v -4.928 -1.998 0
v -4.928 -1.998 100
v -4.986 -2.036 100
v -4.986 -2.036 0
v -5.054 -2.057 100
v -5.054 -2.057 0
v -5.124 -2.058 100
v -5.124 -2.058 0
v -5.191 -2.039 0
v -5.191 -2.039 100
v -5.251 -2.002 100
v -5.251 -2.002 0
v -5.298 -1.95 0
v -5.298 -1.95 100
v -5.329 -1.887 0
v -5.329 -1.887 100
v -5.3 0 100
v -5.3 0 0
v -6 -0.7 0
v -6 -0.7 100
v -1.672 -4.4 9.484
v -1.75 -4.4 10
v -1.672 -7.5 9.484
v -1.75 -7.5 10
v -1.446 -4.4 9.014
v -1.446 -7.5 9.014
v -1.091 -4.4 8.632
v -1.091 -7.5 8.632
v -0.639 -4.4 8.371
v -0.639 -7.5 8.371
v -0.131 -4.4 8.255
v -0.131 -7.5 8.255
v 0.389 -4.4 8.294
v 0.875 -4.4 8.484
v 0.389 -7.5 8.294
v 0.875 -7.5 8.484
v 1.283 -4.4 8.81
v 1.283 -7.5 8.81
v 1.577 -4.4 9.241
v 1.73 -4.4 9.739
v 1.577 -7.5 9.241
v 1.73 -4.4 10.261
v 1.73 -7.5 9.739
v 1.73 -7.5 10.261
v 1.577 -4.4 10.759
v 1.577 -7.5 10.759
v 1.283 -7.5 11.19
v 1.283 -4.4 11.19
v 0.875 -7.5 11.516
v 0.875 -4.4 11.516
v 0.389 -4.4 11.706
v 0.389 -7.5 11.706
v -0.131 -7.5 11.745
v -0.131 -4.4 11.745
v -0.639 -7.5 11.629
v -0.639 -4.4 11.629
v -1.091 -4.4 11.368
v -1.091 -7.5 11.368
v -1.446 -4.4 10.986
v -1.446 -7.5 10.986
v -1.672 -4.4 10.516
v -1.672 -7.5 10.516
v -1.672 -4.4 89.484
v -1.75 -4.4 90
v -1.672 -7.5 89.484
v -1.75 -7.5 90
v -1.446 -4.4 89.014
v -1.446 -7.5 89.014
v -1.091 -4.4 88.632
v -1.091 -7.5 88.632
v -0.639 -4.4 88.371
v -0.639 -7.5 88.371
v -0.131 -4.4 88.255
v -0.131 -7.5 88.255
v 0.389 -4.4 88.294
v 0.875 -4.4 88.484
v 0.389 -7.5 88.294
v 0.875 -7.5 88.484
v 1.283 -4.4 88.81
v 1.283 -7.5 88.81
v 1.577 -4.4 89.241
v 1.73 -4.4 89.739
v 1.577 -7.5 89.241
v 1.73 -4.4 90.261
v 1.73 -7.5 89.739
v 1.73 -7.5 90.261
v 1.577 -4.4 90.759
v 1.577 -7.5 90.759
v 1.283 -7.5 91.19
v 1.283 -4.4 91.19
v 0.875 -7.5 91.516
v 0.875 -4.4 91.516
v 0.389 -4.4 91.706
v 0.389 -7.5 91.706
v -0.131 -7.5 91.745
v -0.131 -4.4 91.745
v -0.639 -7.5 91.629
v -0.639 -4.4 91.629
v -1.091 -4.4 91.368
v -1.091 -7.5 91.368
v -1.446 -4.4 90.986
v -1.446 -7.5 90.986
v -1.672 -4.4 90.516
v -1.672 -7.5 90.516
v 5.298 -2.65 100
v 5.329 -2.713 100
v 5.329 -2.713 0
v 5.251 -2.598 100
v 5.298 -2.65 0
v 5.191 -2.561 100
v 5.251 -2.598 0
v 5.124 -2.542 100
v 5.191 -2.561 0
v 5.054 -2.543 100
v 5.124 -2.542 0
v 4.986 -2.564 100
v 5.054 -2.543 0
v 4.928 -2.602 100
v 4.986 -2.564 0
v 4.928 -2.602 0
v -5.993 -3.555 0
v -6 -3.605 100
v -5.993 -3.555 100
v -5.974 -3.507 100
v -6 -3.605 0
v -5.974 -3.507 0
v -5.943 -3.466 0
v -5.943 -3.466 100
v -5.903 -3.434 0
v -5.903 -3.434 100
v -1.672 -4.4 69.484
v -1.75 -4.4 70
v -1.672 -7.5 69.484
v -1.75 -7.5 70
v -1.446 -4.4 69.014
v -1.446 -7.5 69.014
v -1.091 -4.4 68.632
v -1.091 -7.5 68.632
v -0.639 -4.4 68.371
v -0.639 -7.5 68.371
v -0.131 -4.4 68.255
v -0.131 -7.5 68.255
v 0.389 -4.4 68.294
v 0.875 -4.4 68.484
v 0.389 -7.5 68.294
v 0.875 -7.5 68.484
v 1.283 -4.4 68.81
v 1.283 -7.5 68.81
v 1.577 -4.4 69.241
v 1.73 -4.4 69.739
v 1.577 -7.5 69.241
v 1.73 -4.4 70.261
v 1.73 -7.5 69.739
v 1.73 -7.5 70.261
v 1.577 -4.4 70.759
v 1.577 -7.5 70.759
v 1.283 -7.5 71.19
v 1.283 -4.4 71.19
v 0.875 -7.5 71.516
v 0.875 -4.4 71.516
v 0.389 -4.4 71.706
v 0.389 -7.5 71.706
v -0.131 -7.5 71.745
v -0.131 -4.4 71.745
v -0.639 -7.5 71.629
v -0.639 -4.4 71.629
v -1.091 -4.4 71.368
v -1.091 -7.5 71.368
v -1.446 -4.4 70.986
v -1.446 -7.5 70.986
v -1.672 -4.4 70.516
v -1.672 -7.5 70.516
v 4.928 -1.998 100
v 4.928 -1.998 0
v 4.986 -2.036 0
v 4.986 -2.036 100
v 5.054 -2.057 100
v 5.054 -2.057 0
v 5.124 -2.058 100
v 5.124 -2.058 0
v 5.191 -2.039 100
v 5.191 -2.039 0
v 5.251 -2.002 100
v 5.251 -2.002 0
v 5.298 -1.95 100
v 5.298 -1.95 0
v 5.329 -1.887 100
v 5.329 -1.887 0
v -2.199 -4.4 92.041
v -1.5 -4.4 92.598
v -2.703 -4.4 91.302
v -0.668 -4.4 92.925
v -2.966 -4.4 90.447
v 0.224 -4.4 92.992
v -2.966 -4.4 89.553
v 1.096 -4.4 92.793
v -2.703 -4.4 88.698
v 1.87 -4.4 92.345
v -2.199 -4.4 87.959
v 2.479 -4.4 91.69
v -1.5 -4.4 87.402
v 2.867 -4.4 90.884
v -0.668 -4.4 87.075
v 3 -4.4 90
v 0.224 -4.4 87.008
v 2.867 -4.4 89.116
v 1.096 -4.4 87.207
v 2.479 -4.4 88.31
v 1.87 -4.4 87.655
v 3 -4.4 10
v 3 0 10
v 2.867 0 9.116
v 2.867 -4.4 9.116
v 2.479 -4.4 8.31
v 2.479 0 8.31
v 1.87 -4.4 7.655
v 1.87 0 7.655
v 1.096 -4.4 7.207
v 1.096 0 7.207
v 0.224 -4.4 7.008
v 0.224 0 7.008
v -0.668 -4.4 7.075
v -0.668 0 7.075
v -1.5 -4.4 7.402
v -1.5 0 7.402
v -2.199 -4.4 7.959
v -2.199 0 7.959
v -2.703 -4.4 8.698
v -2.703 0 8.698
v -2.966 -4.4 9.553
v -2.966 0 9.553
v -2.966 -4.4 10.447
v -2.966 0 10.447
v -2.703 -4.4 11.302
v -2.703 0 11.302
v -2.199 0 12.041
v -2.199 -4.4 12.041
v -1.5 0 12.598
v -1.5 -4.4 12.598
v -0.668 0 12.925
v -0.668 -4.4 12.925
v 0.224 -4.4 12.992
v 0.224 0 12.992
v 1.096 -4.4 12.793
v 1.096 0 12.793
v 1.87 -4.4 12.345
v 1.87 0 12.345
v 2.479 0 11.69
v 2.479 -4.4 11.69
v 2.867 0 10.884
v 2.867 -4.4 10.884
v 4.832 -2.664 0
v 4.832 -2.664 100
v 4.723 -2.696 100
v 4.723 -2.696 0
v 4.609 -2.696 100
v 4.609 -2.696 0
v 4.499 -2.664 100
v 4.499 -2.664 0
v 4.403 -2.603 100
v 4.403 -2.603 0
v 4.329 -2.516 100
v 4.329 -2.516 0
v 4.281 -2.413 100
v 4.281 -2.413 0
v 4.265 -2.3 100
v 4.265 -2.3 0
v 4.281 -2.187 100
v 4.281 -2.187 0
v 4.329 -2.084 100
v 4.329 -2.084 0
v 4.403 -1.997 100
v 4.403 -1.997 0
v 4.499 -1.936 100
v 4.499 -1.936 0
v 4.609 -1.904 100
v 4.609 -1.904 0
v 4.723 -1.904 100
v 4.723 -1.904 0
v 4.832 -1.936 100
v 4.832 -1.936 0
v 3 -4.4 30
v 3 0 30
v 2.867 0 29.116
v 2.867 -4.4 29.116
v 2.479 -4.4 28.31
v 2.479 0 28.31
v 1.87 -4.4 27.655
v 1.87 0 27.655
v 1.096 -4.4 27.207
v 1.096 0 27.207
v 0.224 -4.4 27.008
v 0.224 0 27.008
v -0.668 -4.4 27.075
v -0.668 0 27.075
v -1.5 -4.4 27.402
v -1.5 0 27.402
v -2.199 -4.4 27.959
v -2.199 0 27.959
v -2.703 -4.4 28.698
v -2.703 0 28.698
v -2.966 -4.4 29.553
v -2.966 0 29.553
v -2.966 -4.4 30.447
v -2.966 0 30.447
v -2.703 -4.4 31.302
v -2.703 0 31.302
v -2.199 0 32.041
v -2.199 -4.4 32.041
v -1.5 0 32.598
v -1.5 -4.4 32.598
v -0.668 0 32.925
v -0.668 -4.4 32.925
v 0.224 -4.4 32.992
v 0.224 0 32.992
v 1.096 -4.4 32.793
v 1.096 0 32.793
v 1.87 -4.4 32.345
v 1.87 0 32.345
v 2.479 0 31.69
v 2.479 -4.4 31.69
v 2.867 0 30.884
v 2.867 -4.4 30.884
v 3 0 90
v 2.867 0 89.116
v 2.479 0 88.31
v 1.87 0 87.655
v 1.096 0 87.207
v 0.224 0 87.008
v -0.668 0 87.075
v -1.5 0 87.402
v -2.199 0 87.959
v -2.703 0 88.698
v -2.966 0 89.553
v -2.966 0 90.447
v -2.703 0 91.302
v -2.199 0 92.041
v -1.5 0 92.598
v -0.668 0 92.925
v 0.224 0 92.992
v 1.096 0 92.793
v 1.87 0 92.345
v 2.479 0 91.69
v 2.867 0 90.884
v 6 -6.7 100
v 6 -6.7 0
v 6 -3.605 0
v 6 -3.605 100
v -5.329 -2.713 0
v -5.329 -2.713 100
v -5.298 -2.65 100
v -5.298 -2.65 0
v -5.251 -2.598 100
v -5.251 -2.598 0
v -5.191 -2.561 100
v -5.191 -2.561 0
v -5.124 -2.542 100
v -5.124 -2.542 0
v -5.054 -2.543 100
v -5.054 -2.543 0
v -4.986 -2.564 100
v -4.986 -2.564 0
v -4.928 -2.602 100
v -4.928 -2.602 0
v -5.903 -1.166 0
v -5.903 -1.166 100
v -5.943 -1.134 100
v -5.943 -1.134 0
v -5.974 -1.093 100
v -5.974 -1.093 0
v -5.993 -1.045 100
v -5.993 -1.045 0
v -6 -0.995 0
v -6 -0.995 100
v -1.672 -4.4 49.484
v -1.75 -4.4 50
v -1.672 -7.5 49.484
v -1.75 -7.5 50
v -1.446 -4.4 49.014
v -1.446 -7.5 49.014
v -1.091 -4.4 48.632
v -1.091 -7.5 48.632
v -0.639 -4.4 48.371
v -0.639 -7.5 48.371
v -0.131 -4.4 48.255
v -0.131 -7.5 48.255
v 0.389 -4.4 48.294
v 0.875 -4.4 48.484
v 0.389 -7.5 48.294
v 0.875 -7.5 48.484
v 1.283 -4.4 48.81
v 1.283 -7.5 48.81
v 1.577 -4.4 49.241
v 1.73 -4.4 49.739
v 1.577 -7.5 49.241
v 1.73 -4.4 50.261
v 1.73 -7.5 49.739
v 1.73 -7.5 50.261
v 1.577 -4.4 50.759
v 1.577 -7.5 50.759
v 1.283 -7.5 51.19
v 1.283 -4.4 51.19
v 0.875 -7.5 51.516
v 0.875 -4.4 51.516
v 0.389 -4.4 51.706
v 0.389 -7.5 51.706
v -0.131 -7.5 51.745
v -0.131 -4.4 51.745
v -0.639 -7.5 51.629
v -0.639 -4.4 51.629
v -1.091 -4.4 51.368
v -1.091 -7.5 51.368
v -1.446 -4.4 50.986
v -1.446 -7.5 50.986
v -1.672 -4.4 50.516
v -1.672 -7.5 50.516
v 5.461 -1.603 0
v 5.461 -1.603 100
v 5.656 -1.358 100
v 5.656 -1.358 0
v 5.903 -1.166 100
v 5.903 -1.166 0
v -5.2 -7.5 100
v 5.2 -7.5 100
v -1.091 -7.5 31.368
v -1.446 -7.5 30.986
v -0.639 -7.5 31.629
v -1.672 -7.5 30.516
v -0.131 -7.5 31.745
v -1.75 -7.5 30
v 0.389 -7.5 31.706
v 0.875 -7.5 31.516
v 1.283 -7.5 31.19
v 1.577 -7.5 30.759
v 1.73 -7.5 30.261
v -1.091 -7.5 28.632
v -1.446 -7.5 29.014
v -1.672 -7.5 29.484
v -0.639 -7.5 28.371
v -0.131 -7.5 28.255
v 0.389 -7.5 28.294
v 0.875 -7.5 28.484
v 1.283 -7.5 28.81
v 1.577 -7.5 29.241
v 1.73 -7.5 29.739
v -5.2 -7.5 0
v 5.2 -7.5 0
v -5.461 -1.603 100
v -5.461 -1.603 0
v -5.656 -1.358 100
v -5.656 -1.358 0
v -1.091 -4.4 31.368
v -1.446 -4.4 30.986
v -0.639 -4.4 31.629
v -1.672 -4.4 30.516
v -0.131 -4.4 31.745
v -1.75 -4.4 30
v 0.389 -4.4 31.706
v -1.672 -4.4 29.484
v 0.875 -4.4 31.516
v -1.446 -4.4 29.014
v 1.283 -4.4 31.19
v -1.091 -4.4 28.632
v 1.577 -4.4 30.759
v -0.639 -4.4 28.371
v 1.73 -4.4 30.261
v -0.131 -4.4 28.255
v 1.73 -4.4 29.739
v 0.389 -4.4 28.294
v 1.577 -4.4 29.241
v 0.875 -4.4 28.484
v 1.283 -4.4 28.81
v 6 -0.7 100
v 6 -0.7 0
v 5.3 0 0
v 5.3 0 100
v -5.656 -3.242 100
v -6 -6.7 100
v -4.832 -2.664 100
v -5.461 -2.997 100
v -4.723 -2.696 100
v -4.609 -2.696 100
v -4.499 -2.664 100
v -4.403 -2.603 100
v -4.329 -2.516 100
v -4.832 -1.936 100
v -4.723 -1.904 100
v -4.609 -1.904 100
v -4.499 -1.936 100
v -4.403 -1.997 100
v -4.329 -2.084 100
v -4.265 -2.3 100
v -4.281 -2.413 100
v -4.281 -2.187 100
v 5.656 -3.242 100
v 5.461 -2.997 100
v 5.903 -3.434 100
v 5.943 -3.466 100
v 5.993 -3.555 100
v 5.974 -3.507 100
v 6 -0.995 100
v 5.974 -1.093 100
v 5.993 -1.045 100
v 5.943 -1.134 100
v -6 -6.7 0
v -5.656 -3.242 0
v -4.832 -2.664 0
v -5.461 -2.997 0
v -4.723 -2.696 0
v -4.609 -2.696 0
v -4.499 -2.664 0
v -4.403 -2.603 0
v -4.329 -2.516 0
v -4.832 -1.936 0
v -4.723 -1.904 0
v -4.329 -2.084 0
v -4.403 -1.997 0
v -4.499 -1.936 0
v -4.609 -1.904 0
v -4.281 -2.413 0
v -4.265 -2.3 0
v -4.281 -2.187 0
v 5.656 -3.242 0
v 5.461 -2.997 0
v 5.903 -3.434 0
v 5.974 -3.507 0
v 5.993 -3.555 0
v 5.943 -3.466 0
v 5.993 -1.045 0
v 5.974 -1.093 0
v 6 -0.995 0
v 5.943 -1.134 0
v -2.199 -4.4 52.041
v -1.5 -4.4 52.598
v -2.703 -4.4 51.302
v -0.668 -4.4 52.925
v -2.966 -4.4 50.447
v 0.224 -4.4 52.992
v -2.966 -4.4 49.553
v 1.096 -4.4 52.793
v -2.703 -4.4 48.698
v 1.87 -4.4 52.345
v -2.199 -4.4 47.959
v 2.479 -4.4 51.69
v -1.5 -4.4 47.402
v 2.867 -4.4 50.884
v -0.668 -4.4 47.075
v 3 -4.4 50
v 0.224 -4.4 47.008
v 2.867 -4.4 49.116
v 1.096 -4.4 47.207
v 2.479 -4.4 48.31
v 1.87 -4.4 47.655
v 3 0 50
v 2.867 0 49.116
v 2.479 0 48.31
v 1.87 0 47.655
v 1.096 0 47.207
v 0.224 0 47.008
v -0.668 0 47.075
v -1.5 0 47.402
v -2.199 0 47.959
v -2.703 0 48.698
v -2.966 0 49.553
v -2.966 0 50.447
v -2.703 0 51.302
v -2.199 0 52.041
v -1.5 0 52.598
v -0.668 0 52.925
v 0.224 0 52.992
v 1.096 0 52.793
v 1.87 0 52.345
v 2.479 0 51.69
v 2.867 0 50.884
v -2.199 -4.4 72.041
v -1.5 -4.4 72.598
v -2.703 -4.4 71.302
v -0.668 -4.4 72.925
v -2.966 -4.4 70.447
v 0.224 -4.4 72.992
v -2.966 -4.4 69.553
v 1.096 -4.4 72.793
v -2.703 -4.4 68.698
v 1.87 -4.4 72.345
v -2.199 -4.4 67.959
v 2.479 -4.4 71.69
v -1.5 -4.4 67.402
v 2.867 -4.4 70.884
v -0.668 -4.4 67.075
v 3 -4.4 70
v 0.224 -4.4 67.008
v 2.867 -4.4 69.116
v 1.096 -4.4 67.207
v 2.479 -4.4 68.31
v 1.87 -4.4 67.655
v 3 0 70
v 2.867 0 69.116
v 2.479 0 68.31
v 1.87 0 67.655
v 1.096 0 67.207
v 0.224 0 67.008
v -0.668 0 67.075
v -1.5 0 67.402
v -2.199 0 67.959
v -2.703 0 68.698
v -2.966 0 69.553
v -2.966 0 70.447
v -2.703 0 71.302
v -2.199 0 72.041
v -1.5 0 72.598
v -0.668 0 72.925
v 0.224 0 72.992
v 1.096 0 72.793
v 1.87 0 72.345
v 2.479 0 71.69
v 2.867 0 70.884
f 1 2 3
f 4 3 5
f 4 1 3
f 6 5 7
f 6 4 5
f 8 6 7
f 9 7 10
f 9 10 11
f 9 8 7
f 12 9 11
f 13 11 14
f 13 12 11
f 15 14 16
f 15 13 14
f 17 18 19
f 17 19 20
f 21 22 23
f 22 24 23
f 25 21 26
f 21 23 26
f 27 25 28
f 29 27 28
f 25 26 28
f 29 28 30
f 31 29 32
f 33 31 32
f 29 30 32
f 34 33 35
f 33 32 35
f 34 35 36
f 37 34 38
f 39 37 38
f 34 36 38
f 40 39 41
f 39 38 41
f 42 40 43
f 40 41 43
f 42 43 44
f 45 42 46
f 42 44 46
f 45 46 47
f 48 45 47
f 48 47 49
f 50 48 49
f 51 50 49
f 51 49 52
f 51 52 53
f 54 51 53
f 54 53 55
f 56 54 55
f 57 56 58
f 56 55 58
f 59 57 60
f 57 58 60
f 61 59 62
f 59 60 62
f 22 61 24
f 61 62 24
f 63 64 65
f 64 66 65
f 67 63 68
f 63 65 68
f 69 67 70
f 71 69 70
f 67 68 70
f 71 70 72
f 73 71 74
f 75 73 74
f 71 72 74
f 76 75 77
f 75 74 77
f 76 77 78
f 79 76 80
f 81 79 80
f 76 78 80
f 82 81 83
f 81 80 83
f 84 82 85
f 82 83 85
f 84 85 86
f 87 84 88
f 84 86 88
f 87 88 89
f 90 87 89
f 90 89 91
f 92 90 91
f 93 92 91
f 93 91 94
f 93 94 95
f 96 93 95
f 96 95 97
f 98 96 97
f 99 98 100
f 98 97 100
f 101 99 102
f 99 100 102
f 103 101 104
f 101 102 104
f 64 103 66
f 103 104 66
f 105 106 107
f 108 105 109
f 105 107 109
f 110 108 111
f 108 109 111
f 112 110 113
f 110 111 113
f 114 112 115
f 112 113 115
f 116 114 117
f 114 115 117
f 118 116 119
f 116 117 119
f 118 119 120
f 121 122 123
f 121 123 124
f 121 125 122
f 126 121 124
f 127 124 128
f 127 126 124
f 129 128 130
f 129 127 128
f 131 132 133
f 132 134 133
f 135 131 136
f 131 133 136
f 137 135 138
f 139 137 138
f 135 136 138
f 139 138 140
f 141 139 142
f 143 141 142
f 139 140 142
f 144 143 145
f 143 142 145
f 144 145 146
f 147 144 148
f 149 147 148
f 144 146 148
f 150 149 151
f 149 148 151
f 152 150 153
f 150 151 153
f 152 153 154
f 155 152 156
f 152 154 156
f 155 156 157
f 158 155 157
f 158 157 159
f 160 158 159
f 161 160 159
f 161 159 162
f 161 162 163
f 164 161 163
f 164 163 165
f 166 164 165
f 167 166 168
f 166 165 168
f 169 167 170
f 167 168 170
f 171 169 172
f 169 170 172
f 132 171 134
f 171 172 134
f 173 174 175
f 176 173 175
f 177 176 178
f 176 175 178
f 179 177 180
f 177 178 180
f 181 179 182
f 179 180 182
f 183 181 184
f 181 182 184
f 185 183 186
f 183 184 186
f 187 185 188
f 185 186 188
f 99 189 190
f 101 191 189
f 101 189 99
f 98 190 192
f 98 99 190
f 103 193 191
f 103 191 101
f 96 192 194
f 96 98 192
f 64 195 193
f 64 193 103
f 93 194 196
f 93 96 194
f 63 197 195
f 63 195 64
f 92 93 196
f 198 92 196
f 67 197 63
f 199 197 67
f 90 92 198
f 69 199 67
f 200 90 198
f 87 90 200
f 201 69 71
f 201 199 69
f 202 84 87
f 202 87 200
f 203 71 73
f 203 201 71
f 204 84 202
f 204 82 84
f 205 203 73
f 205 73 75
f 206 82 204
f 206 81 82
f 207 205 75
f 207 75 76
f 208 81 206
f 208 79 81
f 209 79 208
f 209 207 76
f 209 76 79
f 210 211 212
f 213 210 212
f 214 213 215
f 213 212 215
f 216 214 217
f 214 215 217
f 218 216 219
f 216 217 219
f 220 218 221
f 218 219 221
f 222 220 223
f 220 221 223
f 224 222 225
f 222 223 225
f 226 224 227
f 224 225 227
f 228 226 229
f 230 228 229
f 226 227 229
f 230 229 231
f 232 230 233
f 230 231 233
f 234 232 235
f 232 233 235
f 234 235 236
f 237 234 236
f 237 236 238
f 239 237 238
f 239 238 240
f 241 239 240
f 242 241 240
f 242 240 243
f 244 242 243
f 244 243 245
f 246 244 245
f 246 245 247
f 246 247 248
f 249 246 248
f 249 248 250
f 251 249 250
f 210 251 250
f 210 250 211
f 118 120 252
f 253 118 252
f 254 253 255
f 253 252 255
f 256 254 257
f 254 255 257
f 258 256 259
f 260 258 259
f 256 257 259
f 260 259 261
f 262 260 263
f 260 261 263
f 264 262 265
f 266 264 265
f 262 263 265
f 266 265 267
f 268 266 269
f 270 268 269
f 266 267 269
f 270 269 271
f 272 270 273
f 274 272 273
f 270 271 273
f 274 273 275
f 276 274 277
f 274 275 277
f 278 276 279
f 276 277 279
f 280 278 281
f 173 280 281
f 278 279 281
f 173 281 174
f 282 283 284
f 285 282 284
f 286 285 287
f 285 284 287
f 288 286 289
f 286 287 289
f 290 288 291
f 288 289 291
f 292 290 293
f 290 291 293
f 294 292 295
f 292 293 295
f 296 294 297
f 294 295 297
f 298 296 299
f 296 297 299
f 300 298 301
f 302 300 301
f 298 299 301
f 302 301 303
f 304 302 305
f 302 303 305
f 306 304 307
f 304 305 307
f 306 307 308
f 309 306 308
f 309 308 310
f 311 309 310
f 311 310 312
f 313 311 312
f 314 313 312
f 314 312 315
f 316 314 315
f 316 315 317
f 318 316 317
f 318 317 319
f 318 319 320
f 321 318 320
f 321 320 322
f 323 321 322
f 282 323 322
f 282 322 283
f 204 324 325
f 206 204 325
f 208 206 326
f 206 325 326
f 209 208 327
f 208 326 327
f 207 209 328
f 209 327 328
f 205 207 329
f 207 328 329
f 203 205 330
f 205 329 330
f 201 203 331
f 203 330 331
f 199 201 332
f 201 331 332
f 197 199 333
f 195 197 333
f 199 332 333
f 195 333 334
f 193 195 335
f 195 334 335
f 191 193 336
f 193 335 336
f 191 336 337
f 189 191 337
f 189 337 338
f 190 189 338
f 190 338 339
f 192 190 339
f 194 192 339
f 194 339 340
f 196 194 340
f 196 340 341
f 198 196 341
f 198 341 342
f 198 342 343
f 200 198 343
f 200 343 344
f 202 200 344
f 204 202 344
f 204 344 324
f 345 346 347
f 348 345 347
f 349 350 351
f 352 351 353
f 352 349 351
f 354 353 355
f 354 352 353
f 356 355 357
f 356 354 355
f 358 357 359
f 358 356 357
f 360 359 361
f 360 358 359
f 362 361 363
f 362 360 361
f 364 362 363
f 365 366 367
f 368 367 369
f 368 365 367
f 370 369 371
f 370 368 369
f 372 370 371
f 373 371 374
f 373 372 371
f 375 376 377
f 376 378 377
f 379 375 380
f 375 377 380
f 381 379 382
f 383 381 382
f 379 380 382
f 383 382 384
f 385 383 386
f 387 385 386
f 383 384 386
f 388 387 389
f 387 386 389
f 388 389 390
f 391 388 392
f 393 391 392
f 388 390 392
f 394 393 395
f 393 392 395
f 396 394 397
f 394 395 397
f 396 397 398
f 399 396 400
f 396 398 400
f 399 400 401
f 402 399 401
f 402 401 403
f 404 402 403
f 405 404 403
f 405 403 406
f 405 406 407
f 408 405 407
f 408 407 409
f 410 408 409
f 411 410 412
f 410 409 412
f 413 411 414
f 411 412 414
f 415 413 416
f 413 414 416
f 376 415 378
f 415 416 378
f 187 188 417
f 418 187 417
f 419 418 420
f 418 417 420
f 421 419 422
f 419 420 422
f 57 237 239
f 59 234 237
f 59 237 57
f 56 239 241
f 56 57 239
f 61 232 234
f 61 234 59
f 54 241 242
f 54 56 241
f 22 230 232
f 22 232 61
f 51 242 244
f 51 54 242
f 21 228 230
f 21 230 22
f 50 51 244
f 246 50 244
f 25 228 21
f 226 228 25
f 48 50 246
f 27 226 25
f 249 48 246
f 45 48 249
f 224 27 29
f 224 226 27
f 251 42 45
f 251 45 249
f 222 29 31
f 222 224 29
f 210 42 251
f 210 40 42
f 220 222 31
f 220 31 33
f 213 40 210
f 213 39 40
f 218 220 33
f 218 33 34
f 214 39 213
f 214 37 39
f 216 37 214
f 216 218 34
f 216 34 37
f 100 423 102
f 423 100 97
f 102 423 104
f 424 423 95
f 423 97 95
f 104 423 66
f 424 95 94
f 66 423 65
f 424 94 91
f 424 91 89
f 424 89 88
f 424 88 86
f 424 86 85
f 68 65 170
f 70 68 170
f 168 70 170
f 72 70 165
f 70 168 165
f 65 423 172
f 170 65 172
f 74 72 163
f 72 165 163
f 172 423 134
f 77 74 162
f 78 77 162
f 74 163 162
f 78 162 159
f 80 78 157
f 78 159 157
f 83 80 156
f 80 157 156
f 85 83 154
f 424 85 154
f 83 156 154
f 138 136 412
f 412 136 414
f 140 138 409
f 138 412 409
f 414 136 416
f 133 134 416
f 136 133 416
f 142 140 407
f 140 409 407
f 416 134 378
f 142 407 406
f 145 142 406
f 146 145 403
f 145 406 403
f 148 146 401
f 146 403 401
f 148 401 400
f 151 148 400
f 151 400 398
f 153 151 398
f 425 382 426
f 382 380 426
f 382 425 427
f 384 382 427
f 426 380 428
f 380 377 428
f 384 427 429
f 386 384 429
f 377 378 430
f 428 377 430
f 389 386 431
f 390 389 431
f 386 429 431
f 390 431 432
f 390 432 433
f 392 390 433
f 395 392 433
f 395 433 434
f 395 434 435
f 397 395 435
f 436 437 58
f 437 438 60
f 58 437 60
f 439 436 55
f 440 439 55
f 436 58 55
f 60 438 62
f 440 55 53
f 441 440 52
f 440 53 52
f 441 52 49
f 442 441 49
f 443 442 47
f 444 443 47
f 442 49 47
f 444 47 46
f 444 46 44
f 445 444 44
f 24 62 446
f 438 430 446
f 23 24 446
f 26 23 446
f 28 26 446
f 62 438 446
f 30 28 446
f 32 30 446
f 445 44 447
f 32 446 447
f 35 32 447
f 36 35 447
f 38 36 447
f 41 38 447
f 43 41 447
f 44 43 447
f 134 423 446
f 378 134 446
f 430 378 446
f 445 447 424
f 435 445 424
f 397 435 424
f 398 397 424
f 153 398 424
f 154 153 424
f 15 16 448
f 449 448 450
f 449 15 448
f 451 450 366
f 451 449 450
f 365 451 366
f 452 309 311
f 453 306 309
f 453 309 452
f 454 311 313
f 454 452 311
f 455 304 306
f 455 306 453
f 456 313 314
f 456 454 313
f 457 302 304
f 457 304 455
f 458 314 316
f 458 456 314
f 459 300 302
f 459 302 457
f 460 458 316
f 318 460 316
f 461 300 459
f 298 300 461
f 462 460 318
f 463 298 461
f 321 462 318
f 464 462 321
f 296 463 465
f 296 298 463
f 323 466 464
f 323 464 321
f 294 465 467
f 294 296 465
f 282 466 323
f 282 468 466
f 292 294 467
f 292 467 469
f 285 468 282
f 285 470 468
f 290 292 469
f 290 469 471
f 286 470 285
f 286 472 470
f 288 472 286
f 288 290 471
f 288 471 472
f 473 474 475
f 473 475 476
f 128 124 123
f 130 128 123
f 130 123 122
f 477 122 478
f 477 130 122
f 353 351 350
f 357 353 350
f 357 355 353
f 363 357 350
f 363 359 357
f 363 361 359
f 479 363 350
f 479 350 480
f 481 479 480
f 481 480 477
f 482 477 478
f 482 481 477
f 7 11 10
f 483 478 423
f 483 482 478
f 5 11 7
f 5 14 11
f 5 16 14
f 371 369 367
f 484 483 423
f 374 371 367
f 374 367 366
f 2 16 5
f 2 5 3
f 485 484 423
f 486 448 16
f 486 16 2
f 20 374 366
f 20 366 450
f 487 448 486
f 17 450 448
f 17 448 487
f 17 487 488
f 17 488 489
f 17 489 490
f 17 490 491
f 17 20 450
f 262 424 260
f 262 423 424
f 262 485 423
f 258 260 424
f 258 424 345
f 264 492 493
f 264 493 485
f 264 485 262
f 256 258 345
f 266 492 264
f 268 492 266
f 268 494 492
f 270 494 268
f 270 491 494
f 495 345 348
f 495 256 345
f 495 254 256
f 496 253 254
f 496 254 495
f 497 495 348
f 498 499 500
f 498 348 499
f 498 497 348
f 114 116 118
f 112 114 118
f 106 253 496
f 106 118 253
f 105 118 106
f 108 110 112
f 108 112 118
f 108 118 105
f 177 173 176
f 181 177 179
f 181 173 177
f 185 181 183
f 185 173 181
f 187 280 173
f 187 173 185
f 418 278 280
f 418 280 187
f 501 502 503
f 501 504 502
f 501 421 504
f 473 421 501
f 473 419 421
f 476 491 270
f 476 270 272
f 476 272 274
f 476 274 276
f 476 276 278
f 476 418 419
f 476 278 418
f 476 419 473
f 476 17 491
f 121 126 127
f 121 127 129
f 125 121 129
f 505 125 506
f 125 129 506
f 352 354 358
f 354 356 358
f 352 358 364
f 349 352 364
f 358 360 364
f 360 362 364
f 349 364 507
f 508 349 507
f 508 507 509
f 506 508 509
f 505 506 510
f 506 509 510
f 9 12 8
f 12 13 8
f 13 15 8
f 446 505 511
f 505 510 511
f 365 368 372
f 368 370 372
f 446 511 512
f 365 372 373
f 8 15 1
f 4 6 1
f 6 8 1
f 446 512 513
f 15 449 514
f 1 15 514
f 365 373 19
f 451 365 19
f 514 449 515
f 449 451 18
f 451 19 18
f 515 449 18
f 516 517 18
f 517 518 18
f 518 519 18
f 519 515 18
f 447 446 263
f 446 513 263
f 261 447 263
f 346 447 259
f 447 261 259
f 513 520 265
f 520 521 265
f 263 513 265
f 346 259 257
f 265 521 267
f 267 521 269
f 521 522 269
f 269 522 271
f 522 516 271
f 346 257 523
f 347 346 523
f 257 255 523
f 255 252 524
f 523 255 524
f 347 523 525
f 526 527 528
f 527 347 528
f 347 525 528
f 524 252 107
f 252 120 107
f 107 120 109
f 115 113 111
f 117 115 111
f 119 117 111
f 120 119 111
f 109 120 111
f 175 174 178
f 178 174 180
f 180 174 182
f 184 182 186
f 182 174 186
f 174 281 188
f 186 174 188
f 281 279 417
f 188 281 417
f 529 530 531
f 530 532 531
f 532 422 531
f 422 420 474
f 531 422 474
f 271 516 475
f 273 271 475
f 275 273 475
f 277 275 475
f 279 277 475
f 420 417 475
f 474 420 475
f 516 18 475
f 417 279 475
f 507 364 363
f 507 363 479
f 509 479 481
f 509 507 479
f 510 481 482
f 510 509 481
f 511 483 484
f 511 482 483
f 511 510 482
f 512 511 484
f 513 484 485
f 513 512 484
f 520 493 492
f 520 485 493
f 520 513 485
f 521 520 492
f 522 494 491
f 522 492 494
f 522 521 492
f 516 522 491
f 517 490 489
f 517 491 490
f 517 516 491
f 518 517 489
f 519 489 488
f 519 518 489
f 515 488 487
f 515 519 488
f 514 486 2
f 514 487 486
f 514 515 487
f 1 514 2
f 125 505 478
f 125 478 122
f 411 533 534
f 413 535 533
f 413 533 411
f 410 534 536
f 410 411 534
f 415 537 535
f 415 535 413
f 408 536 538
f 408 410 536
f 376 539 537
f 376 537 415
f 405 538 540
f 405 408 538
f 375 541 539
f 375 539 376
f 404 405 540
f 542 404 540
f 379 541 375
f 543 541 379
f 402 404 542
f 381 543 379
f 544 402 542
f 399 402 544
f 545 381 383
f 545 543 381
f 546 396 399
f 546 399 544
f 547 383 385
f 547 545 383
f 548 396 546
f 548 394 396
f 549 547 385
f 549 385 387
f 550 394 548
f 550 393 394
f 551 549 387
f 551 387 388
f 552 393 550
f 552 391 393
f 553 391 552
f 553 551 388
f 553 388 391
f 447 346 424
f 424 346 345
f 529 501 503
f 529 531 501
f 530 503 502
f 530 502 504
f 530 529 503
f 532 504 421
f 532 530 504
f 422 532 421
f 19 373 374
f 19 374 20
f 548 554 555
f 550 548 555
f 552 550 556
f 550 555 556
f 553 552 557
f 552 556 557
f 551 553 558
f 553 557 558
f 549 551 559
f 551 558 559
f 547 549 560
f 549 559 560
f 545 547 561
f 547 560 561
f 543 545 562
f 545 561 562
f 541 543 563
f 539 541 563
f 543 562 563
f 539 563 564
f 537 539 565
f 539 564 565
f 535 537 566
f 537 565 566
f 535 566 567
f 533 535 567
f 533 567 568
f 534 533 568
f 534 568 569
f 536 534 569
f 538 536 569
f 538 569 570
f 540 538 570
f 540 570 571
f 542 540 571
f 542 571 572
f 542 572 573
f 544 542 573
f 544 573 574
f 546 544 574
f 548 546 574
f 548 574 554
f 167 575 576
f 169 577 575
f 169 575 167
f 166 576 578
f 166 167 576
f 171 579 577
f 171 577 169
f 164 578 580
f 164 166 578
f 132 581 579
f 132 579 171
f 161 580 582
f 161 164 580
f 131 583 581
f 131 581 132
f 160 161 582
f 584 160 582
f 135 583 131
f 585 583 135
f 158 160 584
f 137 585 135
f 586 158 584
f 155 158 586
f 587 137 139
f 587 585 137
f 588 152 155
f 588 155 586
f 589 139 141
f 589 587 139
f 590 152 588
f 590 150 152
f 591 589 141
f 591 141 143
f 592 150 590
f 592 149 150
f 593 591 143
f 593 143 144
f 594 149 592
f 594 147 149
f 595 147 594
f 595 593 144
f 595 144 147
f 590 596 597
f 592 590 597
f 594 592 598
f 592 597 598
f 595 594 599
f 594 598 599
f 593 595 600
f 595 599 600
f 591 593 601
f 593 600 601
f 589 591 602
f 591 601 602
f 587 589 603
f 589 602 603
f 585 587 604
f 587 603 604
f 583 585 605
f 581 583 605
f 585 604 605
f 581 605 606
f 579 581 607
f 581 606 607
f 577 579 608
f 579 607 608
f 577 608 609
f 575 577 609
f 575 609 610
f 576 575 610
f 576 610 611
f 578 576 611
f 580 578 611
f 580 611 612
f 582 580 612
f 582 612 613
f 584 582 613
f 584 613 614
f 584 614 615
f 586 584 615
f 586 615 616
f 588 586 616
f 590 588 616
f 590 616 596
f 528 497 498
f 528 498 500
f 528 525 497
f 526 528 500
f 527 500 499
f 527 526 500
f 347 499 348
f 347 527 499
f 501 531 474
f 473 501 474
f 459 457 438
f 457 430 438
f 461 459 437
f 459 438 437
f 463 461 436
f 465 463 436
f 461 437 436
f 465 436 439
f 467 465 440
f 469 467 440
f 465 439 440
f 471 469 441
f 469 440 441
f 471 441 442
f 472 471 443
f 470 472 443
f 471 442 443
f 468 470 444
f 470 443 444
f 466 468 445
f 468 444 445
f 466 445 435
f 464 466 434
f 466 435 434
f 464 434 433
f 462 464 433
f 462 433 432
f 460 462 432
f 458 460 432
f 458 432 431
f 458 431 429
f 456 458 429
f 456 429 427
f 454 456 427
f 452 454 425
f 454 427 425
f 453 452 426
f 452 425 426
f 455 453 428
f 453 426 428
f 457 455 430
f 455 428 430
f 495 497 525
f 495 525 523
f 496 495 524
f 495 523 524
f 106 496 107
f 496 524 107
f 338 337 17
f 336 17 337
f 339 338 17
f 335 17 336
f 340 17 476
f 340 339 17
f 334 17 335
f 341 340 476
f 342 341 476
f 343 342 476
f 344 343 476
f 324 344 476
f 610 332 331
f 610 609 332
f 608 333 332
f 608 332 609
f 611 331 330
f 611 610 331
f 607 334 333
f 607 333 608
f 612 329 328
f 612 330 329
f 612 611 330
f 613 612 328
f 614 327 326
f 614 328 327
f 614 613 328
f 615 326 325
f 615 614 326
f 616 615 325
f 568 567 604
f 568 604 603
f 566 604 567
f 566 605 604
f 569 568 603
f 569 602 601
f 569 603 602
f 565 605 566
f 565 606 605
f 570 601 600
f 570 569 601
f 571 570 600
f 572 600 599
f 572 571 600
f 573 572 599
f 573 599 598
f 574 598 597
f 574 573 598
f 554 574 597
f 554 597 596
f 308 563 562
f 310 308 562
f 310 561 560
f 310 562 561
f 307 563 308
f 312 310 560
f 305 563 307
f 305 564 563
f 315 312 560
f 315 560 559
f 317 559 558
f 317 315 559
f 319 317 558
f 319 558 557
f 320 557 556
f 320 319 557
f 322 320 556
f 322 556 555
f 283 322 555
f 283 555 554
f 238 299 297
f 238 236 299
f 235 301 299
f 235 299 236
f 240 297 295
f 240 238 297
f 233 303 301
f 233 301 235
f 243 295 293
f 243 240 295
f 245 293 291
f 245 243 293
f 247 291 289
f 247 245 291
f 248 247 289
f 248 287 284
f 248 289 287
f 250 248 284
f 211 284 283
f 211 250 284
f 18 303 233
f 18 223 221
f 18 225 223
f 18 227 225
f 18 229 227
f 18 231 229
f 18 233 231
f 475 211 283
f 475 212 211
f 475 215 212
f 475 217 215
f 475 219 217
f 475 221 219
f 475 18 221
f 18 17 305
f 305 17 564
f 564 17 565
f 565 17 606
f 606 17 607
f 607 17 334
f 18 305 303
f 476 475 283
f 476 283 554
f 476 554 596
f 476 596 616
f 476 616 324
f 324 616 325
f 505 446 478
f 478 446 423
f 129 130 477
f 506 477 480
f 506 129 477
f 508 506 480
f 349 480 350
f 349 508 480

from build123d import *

# Parameters (mm, degrees)
SKETCH4_W                                           = 12
SKETCH4_H                                           = 7.5
BOSS_EXTRUDE1_DEPTH                                 = 100
CUT_EXTRUDE1_DEPTH                                  = 101.460191121
FILLET1_R                                           = 0.2
CHAMFER1_SIZE                                       = 0.7
CHAMFER2_SIZE                                       = 0.8
CBORE_FOR_M3_HEX_SOCKET_HEAD_CAP_SCREW1_D           = 3.5
CBORE_FOR_M3_HEX_SOCKET_HEAD_CAP_SCREW1_CBORE_D     = 6
CBORE_FOR_M3_HEX_SOCKET_HEAD_CAP_SCREW1_CBORE_DEPTH = 4.4
LPATTERN1_COUNT                                     = 5
LPATTERN1_PITCH                                     = 20


with BuildPart() as part:
    # Sketch4 → Boss-Extrude1 (new body)
    with BuildSketch(Plane.XY):
        with Locations((0, -3.75)):
            Rectangle(SKETCH4_W, SKETCH4_H)
    extrude(amount=BOSS_EXTRUDE1_DEPTH)

    # Sketch5 → Cut-Extrude1 (cut, through all)
    with BuildSketch(Plane.XY):
        with BuildLine():
            ThreePointArc((-5.329252402, -1.887480513), (-7.9134, -2.3), (-5.329252402, -2.712519487))
            ThreePointArc((-5.329252402, -2.712519487), (-5.158134449, -2.549348252), (-4.927570698, -2.601755909))
            ThreePointArc((-4.927570698, -2.601755909), (-4.265, -2.3), (-4.927570698, -1.998244091))
            ThreePointArc((-4.927570698, -1.998244091), (-5.158134449, -2.050651748), (-5.329252402, -1.887480513))
        make_face()
    cut_extrude1 = extrude(amount=CUT_EXTRUDE1_DEPTH, mode=Mode.SUBTRACT)

    # Mirror3: Cut-Extrude1 across plane
    add(cut_extrude1.mirror(Plane(origin=(0, 0, 0), x_dir=(0, 0, 1), z_dir=(1, 0, 0))), mode=Mode.SUBTRACT)

    # Fillet1
    fillet1_edges = [part.edges().sort_by_distance(p)[0] for p in [
        (-6, -3.487185933, 50),
        (-6, -1.112814067, 50),
        (6, -1.112814067, 50),
        (6, -3.487185933, 50),
    ]]
    fillet(fillet1_edges, radius=FILLET1_R)

    # Chamfer1
    chamfer1_edges = [part.edges().sort_by_distance(p)[0] for p in [
        (-6, 0, 50),
        (6, 0, 50),
    ]]
    chamfer(chamfer1_edges, length=CHAMFER1_SIZE)

    # Chamfer2
    chamfer2_edges = [part.edges().sort_by_distance(p)[0] for p in [
        (6, -7.5, 50),
        (-6, -7.5, 50),
    ]]
    chamfer(chamfer2_edges, length=CHAMFER2_SIZE)

    # CBORE for M3 Hex Socket Head Cap Screw1 (through all)
    with Locations(Plane(origin=(0, 0, 0), x_dir=(1, 0, 0), z_dir=(0, 1, 0))):
        with Locations((0, -10)):
            cbore_for_m3_hex_socket_head_cap_screw1 = CounterBoreHole(CBORE_FOR_M3_HEX_SOCKET_HEAD_CAP_SCREW1_D / 2, CBORE_FOR_M3_HEX_SOCKET_HEAD_CAP_SCREW1_CBORE_D / 2, CBORE_FOR_M3_HEX_SOCKET_HEAD_CAP_SCREW1_CBORE_DEPTH)

    # LPattern1: CBORE for M3 Hex Socket Head Cap Screw1 ×5
    with Locations(*[(0, 0, i * LPATTERN1_PITCH) for i in range(1, LPATTERN1_COUNT)]):
        add(cbore_for_m3_hex_socket_head_cap_screw1, mode=Mode.SUBTRACT)


solid = part.part
